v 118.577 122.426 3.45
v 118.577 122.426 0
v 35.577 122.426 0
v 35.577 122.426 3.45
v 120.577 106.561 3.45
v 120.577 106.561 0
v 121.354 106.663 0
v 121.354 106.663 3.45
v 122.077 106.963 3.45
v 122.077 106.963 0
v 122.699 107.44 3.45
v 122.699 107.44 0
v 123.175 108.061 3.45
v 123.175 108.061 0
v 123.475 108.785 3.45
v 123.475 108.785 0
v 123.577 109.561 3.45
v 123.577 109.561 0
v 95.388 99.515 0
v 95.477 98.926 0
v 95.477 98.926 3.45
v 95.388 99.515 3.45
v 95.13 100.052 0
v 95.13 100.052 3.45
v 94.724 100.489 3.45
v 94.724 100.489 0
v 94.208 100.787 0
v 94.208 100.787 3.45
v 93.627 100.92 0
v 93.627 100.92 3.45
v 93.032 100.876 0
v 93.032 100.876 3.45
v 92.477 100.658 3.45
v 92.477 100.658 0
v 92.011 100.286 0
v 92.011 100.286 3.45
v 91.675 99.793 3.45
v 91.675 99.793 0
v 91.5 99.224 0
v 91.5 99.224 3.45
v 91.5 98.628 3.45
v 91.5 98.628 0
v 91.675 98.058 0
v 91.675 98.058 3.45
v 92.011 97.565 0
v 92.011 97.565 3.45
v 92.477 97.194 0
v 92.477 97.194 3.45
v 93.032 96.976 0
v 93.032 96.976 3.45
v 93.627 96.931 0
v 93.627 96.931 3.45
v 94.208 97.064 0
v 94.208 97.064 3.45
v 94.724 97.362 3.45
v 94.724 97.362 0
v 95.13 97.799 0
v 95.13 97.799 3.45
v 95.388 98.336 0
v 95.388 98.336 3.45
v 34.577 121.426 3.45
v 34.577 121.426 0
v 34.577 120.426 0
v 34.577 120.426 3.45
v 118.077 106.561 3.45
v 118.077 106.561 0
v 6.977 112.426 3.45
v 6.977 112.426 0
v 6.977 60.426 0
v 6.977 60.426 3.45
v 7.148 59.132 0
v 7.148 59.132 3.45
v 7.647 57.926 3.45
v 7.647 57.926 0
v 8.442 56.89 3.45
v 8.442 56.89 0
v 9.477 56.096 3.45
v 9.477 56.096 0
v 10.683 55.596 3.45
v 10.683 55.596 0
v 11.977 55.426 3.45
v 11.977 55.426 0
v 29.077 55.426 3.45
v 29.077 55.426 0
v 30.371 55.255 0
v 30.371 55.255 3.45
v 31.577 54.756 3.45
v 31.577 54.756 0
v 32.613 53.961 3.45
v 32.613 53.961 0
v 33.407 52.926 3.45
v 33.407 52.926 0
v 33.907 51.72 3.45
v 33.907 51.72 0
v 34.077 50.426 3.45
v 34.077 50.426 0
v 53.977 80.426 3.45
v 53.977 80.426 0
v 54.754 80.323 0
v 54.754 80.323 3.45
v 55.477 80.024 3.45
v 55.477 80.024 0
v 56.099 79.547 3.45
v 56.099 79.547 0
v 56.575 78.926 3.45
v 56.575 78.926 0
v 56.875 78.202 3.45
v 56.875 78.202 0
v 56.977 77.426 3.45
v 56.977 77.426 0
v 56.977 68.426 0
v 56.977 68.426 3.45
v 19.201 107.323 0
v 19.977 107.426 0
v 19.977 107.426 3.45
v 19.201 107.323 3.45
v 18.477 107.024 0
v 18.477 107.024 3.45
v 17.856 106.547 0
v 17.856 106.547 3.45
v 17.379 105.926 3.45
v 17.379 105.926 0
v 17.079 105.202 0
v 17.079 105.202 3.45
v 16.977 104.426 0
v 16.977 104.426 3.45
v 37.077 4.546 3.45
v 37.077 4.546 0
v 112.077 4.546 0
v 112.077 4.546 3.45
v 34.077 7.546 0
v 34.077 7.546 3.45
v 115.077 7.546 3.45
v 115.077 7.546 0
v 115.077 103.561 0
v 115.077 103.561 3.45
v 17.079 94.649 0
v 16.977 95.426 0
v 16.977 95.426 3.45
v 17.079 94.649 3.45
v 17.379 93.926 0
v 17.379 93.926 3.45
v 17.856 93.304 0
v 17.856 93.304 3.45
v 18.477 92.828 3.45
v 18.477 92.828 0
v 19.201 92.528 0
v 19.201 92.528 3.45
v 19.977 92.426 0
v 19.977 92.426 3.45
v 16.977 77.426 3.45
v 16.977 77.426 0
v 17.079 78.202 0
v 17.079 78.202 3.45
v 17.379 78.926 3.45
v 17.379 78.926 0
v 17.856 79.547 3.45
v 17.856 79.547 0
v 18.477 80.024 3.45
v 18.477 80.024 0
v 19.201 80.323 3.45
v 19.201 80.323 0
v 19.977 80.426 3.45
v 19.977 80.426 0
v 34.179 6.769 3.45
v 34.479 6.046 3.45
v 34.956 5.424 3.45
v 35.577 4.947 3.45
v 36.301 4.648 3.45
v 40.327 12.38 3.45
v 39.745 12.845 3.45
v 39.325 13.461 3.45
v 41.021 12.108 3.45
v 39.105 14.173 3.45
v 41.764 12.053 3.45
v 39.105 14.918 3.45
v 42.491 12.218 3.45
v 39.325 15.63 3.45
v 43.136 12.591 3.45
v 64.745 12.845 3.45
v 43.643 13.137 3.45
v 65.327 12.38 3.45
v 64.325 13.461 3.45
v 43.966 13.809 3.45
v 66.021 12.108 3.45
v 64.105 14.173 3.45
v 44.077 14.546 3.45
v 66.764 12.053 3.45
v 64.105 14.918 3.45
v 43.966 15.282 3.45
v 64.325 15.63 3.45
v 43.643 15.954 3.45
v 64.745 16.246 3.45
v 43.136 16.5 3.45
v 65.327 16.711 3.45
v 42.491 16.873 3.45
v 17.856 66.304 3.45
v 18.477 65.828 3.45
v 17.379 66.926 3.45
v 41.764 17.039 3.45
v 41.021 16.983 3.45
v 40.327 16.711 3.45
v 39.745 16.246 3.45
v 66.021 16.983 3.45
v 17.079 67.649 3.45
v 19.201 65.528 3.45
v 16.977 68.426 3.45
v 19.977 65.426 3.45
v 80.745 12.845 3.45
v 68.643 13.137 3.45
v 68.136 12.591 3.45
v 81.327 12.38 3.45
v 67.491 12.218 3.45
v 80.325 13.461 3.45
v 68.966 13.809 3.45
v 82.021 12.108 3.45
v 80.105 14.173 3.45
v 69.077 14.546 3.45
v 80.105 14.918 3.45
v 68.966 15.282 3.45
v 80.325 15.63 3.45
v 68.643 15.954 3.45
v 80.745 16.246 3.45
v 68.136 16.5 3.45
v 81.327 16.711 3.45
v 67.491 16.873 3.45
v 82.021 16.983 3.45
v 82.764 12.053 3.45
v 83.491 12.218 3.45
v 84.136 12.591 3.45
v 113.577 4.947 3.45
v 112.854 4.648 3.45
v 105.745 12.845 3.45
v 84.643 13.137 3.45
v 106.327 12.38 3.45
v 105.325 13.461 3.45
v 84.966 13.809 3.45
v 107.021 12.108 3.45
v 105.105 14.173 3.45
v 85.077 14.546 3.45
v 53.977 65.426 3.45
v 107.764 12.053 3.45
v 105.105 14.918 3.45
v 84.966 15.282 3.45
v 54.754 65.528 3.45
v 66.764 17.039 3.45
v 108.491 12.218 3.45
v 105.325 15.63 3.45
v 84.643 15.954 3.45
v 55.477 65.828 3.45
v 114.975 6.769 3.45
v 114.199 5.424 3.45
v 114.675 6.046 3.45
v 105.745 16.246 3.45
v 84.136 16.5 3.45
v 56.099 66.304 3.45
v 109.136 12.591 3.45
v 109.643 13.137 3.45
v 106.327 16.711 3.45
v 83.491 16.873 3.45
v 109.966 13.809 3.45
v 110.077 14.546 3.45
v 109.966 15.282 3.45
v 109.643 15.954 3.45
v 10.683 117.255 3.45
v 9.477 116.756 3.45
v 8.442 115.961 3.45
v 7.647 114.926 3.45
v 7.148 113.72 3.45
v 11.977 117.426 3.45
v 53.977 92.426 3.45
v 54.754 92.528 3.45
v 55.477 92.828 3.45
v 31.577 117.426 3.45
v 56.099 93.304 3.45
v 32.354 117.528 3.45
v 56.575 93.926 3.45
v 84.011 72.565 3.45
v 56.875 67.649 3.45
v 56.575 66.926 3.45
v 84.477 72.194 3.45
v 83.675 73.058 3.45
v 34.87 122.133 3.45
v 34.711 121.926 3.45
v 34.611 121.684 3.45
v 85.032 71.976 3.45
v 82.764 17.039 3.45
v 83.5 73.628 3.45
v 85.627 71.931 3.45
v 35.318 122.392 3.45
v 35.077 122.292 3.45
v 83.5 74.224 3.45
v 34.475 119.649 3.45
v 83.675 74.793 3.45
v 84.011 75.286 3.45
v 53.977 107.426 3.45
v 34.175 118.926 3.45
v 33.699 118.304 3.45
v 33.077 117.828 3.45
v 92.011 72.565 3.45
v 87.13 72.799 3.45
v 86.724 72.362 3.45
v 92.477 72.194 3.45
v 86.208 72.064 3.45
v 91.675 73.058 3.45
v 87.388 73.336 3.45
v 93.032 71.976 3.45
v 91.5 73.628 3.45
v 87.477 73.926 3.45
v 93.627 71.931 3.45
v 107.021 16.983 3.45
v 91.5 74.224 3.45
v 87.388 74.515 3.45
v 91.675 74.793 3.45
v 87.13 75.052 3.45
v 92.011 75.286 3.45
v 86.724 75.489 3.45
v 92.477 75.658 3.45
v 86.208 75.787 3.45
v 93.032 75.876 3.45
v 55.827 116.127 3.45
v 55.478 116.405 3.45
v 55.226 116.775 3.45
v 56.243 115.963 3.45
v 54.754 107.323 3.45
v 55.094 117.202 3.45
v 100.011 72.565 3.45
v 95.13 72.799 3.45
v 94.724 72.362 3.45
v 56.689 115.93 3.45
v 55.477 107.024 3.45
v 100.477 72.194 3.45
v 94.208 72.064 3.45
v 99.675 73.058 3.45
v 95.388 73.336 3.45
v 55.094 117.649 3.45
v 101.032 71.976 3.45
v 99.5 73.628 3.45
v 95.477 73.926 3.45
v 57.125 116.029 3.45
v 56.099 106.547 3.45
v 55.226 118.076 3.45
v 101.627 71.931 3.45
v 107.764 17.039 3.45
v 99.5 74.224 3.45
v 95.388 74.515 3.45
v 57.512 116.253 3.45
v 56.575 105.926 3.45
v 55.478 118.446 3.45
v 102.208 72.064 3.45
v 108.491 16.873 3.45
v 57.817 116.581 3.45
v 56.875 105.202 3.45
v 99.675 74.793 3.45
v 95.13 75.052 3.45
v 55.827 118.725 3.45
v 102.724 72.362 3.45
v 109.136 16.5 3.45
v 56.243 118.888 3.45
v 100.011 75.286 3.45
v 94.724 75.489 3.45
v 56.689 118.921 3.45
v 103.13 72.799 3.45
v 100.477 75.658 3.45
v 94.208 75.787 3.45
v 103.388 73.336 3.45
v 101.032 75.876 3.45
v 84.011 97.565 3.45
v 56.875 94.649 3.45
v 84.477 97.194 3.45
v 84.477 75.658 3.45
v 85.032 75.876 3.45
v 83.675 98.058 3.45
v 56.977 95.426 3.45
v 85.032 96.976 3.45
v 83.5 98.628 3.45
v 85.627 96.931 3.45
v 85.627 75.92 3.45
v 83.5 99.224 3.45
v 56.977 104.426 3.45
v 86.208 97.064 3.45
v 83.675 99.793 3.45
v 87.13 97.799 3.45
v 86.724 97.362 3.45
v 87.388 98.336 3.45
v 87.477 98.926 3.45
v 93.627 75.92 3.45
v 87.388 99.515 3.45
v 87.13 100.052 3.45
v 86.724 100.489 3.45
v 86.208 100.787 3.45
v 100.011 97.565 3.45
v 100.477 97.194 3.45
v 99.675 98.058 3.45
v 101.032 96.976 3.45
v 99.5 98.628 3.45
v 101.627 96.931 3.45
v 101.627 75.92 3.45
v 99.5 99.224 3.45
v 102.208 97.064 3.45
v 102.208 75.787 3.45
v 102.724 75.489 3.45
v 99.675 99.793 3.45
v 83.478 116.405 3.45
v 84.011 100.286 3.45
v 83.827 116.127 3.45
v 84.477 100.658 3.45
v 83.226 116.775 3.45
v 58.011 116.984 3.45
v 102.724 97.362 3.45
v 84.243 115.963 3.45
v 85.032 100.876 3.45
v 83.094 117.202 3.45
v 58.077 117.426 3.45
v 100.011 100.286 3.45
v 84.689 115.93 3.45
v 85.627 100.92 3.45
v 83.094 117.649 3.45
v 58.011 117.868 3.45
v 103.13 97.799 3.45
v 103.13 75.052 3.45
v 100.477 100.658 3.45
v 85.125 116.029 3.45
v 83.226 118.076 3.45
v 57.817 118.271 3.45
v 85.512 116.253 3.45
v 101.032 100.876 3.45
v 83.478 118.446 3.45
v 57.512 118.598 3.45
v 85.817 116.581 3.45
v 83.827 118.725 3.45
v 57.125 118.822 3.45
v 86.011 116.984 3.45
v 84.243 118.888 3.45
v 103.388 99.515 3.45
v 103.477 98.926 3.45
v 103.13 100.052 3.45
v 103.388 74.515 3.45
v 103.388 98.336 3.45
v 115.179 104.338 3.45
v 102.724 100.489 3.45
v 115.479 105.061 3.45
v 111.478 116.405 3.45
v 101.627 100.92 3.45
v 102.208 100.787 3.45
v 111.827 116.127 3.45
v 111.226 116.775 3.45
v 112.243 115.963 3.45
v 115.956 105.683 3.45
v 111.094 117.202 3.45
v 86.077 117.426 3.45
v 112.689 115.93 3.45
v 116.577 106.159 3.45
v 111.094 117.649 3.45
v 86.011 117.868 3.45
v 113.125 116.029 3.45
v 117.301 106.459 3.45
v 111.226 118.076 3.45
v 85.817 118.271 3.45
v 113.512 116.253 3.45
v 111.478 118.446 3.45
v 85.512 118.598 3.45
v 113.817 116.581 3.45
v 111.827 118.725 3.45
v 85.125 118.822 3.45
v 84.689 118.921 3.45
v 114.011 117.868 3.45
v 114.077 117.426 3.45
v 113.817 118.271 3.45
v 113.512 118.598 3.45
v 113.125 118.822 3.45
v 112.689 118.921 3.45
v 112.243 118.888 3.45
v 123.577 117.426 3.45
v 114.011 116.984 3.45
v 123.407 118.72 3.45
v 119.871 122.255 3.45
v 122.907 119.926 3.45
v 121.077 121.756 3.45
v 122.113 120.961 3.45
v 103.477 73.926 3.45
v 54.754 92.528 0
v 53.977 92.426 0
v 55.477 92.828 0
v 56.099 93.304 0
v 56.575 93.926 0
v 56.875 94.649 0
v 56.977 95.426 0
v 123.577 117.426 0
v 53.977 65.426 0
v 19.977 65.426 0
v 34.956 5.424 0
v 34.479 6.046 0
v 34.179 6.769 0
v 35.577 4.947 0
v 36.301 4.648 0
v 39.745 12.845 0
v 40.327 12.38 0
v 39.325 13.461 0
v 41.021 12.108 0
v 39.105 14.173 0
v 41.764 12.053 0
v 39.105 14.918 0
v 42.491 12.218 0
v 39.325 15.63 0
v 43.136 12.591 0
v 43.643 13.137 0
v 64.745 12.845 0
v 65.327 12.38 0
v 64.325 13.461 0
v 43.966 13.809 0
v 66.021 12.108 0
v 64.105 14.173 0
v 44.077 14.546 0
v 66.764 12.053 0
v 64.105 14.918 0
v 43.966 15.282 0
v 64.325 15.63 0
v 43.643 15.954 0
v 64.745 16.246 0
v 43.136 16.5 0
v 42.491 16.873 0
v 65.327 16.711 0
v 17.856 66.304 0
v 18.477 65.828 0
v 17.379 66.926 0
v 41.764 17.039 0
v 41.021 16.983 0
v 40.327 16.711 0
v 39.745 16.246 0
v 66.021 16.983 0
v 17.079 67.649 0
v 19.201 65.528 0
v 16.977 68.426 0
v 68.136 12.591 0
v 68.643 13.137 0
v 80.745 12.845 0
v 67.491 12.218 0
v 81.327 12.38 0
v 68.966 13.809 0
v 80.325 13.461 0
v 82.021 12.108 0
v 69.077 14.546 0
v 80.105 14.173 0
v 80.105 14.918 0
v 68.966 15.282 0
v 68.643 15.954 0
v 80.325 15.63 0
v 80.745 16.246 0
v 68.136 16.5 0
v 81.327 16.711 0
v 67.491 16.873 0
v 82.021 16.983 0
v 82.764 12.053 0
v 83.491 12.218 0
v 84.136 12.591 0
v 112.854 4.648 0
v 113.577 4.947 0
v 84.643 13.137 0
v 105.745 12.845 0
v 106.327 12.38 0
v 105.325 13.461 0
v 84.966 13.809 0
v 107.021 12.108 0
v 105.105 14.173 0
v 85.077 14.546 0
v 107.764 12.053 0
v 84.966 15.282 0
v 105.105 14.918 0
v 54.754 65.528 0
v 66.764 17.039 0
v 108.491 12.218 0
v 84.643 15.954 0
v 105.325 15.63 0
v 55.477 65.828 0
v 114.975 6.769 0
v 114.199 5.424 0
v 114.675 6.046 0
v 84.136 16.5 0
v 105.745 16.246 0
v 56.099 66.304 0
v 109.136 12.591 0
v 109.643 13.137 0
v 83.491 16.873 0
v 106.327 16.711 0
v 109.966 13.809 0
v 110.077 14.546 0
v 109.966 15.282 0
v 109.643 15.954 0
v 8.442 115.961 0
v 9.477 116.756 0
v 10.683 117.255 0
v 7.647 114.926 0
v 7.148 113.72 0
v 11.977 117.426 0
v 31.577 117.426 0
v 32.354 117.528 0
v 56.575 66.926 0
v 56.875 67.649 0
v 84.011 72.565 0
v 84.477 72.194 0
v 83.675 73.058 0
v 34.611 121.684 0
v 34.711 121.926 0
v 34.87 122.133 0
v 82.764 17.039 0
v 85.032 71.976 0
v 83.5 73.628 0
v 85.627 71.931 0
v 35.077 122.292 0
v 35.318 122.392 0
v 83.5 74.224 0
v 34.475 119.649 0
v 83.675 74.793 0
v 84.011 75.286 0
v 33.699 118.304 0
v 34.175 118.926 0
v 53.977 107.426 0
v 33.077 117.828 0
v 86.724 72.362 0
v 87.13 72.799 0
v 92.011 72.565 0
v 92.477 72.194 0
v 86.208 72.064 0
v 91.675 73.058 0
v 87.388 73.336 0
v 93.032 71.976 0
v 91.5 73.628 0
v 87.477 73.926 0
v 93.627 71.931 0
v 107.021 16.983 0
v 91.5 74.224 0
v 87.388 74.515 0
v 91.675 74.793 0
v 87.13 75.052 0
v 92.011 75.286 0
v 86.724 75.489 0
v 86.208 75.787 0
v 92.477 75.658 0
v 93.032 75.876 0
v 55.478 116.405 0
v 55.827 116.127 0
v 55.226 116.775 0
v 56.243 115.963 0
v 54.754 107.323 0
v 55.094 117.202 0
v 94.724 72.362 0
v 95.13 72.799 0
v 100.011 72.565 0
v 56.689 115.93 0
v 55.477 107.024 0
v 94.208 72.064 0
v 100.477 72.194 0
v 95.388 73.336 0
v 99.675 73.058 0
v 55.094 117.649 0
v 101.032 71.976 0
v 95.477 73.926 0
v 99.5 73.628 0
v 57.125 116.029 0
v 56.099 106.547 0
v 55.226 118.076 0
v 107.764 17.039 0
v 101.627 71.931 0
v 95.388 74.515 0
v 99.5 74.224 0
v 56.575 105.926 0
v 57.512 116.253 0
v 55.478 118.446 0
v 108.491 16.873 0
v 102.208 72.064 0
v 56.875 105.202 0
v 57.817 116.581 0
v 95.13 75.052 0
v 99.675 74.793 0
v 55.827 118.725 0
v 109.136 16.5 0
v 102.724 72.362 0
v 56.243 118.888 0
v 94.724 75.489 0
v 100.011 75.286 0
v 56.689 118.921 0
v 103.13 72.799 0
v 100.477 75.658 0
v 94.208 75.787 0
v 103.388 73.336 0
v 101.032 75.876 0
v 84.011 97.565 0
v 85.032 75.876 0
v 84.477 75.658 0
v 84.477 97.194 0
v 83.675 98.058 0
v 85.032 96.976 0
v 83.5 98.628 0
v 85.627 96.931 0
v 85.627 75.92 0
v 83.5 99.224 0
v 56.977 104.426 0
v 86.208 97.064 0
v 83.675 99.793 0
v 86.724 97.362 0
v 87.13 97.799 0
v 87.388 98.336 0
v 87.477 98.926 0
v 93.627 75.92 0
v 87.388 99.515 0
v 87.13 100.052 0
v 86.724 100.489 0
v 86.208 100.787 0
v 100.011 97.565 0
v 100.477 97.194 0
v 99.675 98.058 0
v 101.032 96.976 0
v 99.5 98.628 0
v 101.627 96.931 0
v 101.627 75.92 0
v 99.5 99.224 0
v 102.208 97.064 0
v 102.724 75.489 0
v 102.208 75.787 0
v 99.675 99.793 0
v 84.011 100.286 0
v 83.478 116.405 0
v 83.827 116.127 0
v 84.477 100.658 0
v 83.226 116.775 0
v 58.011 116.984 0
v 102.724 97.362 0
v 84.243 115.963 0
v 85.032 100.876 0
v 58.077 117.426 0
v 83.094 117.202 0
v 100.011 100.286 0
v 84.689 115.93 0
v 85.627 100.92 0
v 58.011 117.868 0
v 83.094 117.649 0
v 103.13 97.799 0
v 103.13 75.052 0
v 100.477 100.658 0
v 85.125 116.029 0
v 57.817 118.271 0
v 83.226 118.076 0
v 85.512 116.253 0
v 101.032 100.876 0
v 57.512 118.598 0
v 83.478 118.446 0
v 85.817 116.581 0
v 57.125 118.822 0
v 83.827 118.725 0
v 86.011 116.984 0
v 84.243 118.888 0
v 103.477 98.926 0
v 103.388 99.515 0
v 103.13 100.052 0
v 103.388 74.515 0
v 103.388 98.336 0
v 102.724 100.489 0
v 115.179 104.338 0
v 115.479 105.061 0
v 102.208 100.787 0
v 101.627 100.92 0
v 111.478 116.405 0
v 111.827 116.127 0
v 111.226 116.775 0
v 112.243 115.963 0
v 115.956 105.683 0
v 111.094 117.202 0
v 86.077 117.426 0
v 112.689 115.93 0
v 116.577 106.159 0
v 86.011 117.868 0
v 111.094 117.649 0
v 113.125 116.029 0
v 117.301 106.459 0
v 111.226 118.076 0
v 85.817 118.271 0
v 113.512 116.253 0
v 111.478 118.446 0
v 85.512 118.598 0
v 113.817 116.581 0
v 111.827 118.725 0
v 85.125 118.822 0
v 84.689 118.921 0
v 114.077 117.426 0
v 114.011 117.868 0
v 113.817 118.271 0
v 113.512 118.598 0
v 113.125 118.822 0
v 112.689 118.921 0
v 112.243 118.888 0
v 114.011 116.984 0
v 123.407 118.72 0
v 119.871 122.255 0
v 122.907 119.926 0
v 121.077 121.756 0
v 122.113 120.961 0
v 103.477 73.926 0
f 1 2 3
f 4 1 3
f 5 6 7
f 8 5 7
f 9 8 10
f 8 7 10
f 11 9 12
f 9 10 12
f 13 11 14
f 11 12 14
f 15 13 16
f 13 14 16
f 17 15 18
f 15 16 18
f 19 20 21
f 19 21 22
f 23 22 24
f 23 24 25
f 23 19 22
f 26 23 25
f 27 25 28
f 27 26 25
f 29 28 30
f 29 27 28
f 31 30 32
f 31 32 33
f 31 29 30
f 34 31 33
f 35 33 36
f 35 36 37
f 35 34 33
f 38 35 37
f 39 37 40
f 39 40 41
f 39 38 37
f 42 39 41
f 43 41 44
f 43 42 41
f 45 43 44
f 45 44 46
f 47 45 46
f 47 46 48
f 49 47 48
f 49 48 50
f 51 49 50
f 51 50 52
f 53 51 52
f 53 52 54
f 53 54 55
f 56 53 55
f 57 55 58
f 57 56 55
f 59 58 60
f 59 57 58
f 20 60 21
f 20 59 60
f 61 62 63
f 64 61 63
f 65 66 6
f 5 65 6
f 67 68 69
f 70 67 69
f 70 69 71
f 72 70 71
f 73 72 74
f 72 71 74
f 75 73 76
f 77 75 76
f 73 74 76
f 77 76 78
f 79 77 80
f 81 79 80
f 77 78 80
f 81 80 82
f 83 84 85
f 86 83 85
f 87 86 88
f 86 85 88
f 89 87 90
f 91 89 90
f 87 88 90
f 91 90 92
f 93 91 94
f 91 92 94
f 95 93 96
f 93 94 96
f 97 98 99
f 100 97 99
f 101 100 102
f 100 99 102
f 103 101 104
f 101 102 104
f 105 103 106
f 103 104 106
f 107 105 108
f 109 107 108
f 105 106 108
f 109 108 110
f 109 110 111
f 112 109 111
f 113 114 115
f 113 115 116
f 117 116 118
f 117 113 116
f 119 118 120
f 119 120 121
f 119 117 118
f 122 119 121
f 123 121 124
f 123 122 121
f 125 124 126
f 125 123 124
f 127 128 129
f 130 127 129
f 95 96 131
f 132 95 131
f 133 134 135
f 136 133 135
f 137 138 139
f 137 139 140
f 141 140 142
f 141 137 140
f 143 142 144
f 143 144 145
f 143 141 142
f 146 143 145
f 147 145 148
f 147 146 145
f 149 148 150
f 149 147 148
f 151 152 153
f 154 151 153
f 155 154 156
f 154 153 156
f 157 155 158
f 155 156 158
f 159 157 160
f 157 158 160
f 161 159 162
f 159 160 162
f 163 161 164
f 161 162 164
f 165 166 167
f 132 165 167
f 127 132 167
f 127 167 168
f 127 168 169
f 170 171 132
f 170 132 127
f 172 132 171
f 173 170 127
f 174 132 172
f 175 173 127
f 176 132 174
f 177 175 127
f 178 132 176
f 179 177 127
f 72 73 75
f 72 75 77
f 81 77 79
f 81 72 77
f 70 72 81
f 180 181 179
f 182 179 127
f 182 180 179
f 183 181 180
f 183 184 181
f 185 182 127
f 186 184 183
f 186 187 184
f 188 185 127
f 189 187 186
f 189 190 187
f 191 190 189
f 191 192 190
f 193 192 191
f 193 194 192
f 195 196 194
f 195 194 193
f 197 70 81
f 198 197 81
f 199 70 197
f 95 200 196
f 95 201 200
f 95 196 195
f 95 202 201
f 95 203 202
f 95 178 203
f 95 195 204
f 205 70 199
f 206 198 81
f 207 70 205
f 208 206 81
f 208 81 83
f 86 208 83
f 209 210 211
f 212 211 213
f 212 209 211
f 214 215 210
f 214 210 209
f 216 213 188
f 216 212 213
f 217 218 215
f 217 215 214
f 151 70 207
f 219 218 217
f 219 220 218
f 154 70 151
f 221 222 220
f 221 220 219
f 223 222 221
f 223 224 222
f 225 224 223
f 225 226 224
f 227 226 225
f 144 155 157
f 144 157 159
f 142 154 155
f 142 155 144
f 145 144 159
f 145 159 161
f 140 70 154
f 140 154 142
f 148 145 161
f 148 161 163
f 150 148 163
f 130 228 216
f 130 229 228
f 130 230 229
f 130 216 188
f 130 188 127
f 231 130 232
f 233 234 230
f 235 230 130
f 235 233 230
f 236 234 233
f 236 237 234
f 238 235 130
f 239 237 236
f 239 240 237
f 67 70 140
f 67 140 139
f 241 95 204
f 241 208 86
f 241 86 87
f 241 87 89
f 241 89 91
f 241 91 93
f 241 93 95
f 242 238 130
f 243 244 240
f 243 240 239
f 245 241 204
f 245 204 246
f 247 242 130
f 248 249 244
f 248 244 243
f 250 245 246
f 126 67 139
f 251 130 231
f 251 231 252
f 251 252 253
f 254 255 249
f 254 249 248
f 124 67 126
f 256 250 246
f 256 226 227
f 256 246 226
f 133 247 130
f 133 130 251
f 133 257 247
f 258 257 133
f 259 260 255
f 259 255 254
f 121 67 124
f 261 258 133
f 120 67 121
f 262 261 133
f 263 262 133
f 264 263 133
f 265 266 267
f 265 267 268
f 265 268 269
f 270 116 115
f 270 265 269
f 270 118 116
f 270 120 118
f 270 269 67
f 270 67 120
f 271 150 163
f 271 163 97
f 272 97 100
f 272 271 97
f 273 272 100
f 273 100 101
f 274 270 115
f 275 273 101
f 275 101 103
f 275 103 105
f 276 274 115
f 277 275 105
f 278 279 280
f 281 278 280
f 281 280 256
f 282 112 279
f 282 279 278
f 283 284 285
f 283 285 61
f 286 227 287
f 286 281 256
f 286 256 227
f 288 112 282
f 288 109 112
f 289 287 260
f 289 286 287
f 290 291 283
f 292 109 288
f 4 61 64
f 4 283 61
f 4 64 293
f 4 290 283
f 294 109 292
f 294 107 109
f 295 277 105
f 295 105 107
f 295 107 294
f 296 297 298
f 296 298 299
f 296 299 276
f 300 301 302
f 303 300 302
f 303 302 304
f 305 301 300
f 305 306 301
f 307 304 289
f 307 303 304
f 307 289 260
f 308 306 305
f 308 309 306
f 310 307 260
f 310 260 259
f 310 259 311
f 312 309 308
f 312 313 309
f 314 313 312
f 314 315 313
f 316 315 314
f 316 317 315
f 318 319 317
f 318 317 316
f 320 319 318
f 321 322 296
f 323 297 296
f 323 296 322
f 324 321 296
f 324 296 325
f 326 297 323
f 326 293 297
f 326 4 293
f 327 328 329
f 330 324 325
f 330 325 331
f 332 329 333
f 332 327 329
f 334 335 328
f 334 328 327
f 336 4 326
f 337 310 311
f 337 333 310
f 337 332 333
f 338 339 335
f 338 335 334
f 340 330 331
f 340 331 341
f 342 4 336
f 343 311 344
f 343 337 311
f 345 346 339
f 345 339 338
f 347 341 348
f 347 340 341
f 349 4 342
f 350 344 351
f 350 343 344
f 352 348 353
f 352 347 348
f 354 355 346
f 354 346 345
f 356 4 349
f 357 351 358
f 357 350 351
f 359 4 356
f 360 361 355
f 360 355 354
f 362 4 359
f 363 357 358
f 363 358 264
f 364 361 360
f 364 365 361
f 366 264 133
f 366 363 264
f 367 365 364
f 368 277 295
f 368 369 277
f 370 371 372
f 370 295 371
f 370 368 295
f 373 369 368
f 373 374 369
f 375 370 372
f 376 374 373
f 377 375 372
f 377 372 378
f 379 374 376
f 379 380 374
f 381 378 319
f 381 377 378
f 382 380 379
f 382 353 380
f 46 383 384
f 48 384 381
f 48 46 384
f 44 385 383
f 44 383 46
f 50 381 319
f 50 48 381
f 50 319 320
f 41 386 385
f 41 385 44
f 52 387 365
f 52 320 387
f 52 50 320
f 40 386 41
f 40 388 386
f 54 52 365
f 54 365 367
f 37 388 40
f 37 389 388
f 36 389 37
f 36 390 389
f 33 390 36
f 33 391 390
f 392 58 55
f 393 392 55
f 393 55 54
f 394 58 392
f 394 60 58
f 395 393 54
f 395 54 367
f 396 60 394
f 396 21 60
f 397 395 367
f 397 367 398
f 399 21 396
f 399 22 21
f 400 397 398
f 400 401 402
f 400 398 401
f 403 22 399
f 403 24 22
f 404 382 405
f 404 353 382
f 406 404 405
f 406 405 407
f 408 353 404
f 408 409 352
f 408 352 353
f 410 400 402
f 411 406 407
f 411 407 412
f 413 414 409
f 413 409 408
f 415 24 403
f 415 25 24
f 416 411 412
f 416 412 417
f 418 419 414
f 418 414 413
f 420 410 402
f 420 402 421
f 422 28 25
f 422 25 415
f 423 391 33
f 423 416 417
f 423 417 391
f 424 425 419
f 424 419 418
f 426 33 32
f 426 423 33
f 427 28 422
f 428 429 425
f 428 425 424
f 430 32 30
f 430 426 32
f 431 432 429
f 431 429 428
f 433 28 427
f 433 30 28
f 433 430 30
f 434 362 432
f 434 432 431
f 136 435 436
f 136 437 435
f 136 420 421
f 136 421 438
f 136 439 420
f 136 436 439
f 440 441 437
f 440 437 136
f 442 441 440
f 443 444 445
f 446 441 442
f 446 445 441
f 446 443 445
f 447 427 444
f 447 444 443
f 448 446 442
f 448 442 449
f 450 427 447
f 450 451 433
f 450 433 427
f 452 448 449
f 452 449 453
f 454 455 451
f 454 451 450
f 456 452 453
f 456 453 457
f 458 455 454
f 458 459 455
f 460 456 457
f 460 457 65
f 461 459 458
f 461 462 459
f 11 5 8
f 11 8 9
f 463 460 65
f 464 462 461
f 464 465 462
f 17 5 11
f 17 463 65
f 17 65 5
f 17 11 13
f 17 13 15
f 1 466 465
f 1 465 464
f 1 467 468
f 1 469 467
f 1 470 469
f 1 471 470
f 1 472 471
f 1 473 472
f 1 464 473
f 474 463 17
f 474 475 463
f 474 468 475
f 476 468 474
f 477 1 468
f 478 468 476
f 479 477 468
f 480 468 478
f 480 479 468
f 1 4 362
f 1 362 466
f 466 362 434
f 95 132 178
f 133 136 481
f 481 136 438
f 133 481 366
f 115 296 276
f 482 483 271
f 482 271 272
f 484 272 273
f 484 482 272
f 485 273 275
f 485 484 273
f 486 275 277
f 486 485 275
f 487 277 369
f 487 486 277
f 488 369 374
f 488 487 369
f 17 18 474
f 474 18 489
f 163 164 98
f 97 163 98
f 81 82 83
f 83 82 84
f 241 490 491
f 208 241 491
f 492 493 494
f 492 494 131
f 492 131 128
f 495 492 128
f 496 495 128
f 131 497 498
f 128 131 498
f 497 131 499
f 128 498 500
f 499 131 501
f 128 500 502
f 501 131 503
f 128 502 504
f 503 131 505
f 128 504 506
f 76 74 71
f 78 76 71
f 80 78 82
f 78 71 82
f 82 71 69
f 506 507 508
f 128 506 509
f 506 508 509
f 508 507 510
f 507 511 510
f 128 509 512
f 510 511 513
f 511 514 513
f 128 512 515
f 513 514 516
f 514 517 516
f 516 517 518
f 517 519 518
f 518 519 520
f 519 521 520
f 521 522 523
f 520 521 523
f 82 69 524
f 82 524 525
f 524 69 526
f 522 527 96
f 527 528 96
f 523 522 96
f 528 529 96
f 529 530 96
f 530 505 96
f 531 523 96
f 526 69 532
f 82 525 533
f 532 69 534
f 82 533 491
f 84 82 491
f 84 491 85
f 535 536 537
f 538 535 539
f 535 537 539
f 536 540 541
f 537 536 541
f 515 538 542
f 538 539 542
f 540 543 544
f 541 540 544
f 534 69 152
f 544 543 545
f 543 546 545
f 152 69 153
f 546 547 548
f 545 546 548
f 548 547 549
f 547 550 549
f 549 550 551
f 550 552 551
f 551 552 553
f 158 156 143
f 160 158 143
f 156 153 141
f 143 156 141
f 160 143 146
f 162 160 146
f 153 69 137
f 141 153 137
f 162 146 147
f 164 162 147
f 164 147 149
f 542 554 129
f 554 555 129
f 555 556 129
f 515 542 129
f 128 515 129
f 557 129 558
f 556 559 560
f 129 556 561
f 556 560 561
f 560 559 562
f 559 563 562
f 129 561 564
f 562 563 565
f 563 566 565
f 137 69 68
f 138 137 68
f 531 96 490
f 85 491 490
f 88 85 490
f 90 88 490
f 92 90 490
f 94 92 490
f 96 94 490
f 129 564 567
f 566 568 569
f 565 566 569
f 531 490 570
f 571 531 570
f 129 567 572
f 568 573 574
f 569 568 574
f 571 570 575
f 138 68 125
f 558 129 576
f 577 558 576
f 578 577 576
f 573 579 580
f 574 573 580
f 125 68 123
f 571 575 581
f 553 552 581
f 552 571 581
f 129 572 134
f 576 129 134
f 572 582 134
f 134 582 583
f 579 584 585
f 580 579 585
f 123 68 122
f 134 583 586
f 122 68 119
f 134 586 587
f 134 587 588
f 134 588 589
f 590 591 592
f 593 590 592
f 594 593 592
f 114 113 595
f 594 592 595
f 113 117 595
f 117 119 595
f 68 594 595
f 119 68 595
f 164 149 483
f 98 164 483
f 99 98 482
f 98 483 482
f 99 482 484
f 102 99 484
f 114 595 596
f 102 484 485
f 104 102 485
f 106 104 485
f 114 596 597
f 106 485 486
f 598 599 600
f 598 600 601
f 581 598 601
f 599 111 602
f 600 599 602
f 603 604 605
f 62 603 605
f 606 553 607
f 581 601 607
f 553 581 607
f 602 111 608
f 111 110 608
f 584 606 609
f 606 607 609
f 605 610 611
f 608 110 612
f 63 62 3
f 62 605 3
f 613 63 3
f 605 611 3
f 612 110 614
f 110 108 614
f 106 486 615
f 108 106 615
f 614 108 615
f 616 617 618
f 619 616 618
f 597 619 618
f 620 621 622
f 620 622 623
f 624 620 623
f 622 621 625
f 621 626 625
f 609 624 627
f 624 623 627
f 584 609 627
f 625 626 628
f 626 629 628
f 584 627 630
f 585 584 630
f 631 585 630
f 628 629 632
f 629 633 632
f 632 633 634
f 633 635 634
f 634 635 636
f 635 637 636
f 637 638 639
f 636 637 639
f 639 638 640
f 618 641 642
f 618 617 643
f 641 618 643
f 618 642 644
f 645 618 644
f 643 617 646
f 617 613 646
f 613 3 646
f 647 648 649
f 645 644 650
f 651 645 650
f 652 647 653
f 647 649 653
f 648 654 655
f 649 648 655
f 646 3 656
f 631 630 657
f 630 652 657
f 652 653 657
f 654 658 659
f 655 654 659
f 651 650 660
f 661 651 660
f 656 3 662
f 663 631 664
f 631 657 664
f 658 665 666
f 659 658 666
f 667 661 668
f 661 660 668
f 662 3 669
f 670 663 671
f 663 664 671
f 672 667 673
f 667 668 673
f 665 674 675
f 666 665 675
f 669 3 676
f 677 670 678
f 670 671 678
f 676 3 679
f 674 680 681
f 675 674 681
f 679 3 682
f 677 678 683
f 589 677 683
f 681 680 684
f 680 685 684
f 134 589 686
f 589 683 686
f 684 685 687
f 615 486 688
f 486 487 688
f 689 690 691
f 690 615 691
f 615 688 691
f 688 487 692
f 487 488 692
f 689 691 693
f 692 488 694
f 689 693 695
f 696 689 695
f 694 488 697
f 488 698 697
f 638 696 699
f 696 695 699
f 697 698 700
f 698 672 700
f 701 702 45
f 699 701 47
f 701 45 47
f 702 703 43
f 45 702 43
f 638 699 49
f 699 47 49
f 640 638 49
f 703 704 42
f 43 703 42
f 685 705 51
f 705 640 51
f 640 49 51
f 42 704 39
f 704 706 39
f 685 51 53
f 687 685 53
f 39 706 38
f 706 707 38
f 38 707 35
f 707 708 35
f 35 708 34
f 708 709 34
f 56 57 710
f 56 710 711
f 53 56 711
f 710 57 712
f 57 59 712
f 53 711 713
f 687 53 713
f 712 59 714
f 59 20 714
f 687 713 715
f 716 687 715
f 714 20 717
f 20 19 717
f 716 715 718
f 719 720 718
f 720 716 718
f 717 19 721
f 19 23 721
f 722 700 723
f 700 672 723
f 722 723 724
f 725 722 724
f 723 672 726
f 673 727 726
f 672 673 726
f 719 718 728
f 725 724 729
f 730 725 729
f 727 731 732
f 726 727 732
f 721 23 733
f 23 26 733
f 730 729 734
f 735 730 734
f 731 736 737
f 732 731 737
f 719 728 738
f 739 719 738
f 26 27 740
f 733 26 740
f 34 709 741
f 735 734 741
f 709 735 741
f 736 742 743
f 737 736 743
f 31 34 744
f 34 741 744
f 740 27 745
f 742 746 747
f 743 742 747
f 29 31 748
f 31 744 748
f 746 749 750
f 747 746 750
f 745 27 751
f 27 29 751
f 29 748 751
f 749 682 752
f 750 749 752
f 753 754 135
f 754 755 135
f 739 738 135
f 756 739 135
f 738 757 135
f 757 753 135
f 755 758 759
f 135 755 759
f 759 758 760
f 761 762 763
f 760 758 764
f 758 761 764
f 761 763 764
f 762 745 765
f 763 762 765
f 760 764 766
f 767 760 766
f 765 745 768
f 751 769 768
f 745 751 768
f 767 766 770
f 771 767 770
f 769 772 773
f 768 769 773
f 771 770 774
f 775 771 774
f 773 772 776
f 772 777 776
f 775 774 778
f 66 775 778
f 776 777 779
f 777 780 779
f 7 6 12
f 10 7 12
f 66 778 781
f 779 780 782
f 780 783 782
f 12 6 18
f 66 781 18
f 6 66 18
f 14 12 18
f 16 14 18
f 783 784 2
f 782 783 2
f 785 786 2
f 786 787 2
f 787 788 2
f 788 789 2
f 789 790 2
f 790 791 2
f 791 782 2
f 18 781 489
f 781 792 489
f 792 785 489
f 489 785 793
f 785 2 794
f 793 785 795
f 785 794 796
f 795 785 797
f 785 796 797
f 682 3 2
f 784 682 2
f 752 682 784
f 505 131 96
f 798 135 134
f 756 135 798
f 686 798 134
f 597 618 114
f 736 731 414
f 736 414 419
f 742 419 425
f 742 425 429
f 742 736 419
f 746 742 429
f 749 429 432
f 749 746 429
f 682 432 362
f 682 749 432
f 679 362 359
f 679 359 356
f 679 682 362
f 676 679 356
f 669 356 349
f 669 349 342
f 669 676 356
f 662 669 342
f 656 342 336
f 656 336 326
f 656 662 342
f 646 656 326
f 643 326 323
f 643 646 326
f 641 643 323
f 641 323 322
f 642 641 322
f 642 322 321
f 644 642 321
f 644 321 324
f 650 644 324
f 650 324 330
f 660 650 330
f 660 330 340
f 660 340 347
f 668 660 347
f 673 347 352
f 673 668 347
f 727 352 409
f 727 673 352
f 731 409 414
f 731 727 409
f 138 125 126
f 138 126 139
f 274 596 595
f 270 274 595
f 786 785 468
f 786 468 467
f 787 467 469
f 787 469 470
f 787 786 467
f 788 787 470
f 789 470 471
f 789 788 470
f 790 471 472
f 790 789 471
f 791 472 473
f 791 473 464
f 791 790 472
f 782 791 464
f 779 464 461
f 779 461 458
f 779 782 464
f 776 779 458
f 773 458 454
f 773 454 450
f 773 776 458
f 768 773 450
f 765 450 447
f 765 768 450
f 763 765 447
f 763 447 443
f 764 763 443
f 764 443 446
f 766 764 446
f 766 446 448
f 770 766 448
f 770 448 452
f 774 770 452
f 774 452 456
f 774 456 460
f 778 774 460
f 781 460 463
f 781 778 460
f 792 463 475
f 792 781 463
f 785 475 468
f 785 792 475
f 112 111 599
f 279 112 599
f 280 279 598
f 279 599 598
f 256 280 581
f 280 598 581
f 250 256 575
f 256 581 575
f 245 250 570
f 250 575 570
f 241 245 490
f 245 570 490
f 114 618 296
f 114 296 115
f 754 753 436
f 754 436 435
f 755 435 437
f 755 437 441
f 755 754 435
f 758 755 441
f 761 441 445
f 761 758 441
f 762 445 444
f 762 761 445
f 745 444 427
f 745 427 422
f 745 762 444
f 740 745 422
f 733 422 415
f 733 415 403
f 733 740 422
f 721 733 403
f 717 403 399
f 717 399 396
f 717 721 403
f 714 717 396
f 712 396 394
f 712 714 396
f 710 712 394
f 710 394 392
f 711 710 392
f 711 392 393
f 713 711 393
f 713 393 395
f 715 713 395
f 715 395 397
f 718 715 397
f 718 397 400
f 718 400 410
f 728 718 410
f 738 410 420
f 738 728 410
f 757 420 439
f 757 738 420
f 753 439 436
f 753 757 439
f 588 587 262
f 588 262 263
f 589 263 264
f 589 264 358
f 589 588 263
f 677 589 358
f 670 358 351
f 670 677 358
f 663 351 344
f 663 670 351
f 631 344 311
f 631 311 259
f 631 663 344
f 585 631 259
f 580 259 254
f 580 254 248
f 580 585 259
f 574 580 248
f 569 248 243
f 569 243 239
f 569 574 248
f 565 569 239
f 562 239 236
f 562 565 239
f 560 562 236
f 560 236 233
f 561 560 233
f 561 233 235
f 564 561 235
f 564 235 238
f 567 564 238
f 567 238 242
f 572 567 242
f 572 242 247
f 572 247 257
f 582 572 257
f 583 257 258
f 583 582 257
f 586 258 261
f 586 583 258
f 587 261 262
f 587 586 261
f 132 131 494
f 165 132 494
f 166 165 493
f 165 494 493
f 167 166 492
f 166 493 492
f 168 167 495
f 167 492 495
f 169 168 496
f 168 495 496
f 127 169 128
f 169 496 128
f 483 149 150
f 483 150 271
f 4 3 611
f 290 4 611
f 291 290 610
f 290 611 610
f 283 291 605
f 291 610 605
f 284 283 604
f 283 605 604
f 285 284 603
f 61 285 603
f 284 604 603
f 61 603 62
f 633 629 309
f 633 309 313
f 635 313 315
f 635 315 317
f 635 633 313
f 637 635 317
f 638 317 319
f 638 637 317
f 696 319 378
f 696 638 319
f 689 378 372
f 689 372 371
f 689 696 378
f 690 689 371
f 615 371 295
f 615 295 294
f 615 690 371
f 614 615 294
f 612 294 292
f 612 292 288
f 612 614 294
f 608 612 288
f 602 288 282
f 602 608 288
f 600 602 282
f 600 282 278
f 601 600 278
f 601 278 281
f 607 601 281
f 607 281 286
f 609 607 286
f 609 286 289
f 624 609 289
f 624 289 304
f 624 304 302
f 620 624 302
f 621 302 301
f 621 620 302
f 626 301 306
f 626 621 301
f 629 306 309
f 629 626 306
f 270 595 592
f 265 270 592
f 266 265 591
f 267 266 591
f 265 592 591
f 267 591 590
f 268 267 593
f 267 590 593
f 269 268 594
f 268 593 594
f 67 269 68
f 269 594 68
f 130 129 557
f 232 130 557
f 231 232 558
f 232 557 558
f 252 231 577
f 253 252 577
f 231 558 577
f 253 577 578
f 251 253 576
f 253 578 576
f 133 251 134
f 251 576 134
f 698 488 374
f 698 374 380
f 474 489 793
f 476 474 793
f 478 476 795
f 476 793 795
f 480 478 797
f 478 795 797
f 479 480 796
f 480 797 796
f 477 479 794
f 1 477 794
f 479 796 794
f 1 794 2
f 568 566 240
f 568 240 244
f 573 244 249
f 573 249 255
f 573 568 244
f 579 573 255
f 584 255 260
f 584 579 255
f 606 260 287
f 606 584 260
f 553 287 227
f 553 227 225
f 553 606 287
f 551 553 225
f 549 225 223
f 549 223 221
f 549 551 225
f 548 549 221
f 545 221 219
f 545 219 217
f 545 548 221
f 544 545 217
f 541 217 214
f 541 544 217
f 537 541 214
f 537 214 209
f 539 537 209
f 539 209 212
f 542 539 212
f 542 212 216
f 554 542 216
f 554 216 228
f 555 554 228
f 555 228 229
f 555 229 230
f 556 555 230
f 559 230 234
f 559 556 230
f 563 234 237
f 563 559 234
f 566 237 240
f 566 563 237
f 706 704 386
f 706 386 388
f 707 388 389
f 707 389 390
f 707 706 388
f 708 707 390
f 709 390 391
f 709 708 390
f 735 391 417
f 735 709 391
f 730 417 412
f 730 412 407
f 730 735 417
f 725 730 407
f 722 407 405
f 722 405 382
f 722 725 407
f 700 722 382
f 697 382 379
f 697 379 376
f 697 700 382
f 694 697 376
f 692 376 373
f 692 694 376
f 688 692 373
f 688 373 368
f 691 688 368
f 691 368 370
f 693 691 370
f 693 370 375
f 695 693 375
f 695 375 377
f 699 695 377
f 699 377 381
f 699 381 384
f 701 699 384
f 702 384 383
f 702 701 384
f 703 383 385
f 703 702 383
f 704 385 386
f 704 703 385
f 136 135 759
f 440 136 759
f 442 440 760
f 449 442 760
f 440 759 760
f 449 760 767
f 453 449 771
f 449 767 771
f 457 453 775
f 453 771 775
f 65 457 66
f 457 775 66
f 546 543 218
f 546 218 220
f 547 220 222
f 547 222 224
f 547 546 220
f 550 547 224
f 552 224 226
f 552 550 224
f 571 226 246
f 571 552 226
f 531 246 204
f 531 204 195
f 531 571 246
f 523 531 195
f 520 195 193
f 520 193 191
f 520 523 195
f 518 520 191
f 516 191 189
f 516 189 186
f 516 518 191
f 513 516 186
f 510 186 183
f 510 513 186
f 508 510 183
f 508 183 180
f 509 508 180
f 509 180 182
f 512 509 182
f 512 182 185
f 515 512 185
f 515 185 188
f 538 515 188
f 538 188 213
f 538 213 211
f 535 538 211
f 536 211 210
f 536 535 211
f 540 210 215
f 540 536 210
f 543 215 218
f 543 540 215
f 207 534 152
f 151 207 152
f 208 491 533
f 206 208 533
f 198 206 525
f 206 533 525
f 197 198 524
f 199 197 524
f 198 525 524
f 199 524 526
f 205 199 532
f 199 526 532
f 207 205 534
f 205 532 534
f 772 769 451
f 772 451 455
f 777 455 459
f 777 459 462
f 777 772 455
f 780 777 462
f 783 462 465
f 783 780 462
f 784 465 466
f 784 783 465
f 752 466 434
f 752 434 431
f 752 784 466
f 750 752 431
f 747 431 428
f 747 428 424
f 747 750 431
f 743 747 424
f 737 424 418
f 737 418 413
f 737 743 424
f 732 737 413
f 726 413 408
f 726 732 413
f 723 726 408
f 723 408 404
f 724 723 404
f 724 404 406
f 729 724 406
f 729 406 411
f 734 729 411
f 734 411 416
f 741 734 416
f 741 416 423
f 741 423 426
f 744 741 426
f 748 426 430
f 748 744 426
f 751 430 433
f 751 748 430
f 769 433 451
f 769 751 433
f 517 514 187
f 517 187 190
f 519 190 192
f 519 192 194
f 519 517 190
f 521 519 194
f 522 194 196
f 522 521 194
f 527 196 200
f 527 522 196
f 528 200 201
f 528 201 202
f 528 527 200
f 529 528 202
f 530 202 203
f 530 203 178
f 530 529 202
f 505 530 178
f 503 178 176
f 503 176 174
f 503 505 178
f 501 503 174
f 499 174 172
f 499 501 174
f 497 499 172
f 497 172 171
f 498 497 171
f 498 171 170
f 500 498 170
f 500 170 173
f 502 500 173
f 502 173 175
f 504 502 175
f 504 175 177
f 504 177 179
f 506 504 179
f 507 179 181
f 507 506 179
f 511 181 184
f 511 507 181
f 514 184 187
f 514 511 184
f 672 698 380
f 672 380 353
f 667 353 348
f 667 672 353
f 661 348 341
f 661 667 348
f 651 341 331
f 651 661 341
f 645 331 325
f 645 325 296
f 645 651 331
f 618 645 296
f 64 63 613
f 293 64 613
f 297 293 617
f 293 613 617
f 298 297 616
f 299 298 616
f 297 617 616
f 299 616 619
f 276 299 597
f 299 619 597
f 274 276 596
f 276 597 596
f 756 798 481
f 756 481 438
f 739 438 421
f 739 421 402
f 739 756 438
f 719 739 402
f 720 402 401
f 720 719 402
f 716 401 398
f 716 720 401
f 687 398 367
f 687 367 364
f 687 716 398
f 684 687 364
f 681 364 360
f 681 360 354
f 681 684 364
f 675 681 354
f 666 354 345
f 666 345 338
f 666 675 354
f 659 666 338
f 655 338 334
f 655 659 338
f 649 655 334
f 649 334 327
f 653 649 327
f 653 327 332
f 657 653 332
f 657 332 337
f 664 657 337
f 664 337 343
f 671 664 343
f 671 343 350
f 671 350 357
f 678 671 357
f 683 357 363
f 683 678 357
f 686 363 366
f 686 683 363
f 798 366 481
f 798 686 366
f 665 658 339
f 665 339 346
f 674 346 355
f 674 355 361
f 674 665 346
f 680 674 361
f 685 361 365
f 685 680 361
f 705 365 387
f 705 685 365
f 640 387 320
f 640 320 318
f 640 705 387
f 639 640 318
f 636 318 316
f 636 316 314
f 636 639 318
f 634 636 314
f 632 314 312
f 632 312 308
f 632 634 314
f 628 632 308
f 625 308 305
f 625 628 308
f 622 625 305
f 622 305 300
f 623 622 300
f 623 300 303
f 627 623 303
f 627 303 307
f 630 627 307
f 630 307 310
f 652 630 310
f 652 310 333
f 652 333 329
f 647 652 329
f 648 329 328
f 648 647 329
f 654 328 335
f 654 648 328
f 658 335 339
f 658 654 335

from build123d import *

# Parameters (mm, degrees)
MODEL_R         = 2.5
MODEL_R_2       = 2
MODEL_R_3       = 1.5
EXTRUDE_1_DEPTH = 3.45


with BuildPart() as part:
    # Model → 凸台-拉伸1 (new body)
    with BuildSketch(Plane.XY):
        with BuildLine():
            Line((123.577210347, 109.56127227), (123.577210347, 117.42565066))
            ThreePointArc((123.577210347, 117.42565066), (122.112744253, 120.961184566), (118.577210347, 122.42565066))
            Line((118.577210347, 122.42565066), (35.577210347, 122.42565066))
            ThreePointArc((35.577210347, 122.42565066), (34.870103566, 122.132757441), (34.577210347, 121.42565066))
            Line((34.577210347, 121.42565066), (34.577210347, 120.42565066))
            ThreePointArc((34.577210347, 120.42565066), (33.69853069, 118.304330316), (31.577210347, 117.42565066))
            Line((31.577210347, 117.42565066), (11.977210347, 117.42565066))
            ThreePointArc((11.977210347, 117.42565066), (8.441676441, 115.961184566), (6.977210347, 112.42565066))
            Line((6.977210347, 112.42565066), (6.977210347, 60.42565066))
            ThreePointArc((6.977210347, 60.42565066), (8.441676441, 56.890116754), (11.977210347, 55.42565066))
            Line((11.977210347, 55.42565066), (29.077210347, 55.42565066))
            ThreePointArc((29.077210347, 55.42565066), (32.612744253, 53.961184566), (34.077210347, 50.42565066))
            Line((34.077210347, 50.42565066), (34.077210347, 7.54555066))
            ThreePointArc((34.077210347, 7.54555066), (34.955890003, 5.424230316), (37.077210347, 4.54555066))
            Line((37.077210347, 4.54555066), (112.077210347, 4.54555066))
            ThreePointArc((112.077210347, 4.54555066), (114.19853069, 5.424230316), (115.077210347, 7.54555066))
            Line((115.077210347, 7.54555066), (115.077210347, 103.56127227))
            ThreePointArc((115.077210347, 103.56127227), (115.955890003, 105.682592613), (118.077210347, 106.56127227))
            Line((118.077210347, 106.56127227), (120.577210347, 106.56127227))
            ThreePointArc((120.577210347, 106.56127227), (122.69853069, 107.439951926), (123.577210347, 109.56127227))
        make_face()
        with Locations((82.577210347, 14.54555066)):
            Circle(MODEL_R, mode=Mode.SUBTRACT)
        with Locations((107.577210347, 14.54555066)):
            Circle(MODEL_R, mode=Mode.SUBTRACT)
        with Locations((101.477210347, 98.92565066)):
            Circle(MODEL_R_2, mode=Mode.SUBTRACT)
        with Locations((93.477210347, 98.92565066)):
            Circle(MODEL_R_2, mode=Mode.SUBTRACT)
        with Locations((85.477210347, 98.92565066)):
            Circle(MODEL_R_2, mode=Mode.SUBTRACT)
        with Locations((93.477210347, 73.92565066)):
            Circle(MODEL_R_2, mode=Mode.SUBTRACT)
        with Locations((101.477210347, 73.92565066)):
            Circle(MODEL_R_2, mode=Mode.SUBTRACT)
        with Locations((85.477210347, 73.92565066)):
            Circle(MODEL_R_2, mode=Mode.SUBTRACT)
        with Locations((84.577210347, 117.42565066)):
            Circle(MODEL_R_3, mode=Mode.SUBTRACT)
        with Locations((112.577210347, 117.42565066)):
            Circle(MODEL_R_3, mode=Mode.SUBTRACT)
        with Locations((56.577210347, 117.42565066)):
            Circle(MODEL_R_3, mode=Mode.SUBTRACT)
        with Locations((41.577210347, 14.54555066)):
            Circle(MODEL_R, mode=Mode.SUBTRACT)
        with Locations((66.577210347, 14.54555066)):
            Circle(MODEL_R, mode=Mode.SUBTRACT)
        with BuildLine():
            Line((53.977210347, 65.42565066), (19.977210347, 65.42565066))
            ThreePointArc((19.977210347, 65.42565066), (17.855890003, 66.304330316), (16.977210347, 68.42565066))
            Line((16.977210347, 68.42565066), (16.977210347, 77.42565066))
            ThreePointArc((16.977210347, 77.42565066), (17.855890003, 79.546971003), (19.977210347, 80.42565066))
            Line((19.977210347, 80.42565066), (53.977210347, 80.42565066))
            ThreePointArc((53.977210347, 80.42565066), (56.09853069, 79.546971003), (56.977210347, 77.42565066))
            Line((56.977210347, 77.42565066), (56.977210347, 68.42565066))
            ThreePointArc((56.977210347, 68.42565066), (56.09853069, 66.304330316), (53.977210347, 65.42565066))
        make_face(mode=Mode.SUBTRACT)
        with BuildLine():
            Line((53.977210347, 107.42565066), (19.977210347, 107.42565066))
            ThreePointArc((19.977210347, 107.42565066), (17.855890003, 106.546971003), (16.977210347, 104.42565066))
            Line((16.977210347, 104.42565066), (16.977210347, 95.42565066))
            ThreePointArc((16.977210347, 95.42565066), (17.855890003, 93.304330316), (19.977210347, 92.42565066))
            Line((19.977210347, 92.42565066), (53.977210347, 92.42565066))
            ThreePointArc((53.977210347, 92.42565066), (56.09853069, 93.304330316), (56.977210347, 95.42565066))
            Line((56.977210347, 95.42565066), (56.977210347, 104.42565066))
            ThreePointArc((56.977210347, 104.42565066), (56.09853069, 106.546971003), (53.977210347, 107.42565066))
        make_face(mode=Mode.SUBTRACT)
    extrude(amount=EXTRUDE_1_DEPTH)


solid = part.part
